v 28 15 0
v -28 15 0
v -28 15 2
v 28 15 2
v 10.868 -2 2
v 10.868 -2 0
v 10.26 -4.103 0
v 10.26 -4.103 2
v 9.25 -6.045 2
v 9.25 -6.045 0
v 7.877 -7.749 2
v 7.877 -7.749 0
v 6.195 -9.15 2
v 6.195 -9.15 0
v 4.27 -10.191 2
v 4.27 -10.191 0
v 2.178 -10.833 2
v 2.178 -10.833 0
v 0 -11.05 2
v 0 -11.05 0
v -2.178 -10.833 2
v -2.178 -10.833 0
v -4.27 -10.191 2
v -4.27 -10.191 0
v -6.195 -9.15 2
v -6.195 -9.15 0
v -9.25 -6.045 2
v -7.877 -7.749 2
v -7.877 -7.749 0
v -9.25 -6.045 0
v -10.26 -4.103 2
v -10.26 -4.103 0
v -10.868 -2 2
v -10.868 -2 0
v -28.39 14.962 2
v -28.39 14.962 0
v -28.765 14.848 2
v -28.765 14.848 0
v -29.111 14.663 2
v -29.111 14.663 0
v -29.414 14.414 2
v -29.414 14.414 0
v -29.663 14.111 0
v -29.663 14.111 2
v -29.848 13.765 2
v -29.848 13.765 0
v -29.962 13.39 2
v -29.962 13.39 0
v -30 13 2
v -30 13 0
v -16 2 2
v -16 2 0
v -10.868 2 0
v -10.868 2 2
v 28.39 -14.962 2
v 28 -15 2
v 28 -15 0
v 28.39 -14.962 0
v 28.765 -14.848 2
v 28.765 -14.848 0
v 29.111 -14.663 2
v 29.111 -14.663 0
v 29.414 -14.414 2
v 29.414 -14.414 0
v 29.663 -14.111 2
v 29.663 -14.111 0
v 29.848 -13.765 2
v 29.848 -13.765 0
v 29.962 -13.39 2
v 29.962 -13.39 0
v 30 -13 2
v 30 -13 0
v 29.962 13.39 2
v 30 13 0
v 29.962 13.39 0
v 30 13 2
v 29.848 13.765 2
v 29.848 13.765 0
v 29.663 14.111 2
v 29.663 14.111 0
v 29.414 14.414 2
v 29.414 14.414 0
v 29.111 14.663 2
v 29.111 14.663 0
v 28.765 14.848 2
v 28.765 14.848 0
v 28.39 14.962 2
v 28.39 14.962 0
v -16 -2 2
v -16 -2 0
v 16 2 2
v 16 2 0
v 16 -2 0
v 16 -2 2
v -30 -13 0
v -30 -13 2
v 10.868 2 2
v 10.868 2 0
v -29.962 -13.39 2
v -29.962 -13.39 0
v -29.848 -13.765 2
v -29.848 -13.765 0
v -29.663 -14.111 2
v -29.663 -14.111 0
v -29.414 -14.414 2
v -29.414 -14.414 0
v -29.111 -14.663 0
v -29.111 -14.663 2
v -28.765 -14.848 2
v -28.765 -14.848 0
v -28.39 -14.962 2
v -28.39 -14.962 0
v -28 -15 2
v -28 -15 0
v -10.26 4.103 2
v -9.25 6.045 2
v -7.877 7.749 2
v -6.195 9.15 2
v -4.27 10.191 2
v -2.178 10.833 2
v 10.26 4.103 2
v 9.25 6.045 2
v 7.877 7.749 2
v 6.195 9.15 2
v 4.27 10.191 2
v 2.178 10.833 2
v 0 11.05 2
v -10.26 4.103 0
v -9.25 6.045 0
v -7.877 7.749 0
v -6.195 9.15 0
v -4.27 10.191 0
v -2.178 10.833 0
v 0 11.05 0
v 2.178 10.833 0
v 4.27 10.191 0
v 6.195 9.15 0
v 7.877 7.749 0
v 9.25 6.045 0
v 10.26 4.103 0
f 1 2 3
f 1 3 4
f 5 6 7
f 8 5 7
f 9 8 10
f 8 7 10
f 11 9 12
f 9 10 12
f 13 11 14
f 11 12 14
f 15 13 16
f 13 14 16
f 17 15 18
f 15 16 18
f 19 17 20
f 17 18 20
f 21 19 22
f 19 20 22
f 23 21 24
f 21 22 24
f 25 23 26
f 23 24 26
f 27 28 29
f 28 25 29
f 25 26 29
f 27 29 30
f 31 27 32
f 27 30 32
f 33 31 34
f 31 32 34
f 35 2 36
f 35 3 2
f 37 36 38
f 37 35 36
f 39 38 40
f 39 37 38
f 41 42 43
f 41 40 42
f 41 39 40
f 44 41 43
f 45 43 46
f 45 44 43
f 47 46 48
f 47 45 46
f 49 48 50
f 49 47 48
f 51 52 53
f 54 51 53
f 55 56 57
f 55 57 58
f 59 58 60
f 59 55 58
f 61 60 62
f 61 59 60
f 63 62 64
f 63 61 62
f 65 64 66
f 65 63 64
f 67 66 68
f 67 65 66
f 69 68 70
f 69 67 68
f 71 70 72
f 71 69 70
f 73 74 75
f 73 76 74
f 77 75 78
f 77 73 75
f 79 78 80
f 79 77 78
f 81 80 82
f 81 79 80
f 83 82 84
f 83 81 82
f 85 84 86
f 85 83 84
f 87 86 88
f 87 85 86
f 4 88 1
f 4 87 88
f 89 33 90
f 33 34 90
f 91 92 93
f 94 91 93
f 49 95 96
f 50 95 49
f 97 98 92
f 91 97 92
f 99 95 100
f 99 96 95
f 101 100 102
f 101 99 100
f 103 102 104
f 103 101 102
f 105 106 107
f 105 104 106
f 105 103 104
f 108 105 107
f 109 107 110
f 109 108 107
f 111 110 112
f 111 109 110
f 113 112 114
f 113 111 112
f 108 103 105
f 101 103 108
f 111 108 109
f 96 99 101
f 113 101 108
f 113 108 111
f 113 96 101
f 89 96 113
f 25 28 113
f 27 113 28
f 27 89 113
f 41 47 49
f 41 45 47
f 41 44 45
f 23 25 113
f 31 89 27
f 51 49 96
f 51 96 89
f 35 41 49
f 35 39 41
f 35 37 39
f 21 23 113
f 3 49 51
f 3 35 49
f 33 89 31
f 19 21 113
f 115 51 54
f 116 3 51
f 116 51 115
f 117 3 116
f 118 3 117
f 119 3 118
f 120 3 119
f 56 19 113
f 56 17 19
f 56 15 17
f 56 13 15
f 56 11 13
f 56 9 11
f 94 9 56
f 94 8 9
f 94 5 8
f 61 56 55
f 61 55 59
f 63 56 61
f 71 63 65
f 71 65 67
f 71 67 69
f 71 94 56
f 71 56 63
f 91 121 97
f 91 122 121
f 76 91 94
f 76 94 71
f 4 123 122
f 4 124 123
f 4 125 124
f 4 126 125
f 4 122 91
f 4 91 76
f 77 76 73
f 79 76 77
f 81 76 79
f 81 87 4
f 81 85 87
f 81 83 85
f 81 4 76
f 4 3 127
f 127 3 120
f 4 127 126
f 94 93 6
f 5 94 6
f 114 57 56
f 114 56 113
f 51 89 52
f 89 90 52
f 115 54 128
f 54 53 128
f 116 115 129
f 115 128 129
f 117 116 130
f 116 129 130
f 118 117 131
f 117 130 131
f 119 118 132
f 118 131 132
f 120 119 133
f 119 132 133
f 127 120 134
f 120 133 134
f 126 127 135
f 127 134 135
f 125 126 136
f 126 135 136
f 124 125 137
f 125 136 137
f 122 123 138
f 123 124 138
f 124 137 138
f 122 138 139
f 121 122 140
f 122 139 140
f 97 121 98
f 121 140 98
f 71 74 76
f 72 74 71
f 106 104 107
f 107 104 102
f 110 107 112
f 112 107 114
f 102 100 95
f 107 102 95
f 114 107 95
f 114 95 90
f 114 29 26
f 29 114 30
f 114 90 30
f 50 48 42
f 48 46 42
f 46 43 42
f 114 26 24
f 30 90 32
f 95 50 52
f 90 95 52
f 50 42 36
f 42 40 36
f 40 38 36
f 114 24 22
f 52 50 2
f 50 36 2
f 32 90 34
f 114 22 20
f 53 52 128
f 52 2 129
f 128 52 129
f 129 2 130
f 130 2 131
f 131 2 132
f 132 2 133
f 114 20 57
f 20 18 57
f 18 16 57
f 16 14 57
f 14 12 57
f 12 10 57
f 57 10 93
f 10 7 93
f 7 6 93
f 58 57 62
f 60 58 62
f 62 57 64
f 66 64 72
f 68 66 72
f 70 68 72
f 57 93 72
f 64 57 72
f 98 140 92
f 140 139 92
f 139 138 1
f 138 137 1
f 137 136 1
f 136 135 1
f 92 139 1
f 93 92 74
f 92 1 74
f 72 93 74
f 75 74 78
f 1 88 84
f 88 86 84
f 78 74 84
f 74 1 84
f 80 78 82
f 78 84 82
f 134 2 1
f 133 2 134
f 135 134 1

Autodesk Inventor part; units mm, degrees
ref_plane "YZ Plane" through (0, 0, 0) normal (1, 0, 0) x (0, 1, 0)
ref_plane "XZ Plane" through (0, 0, 0) normal (0, 1, 0) x (-1, 0, 0)
ref_plane "XY Plane" through (0, 0, 0) normal (0, 0, 1) x (1, 0, 0)
sketch "Sketch1" plane through (0, 0, 0) normal (0, 0, 1) x (1, 0, 0)
  arc A0 (-10.8675, 2) -> (-10.8675, -2) centre (0, 0) ccw
  line L0 (16, -2) -> (-16, -2)
  line L1 (-16, -2) -> (-16, 2)
  line L2 (-16, 2) -> (16, 2)
  line L3 (16, 2) -> (16, -2)
  line L4 (16, -2) -> (-16, 2) construction
  line L5 (-16, -2) -> (16, 2) construction
  arc A1 (10.8675, 2) -> (-10.8675, 2) centre (0, 0) ccw
  arc A2 (-10.8675, -2) -> (10.8675, -2) centre (0, 0) ccw
  line L6 (30, -15) -> (-30, -15)
  line L7 (-30, -15) -> (-30, 15)
  line L8 (-30, 15) -> (30, 15)
  line L9 (30, 15) -> (30, -15)
  line L10 (30, -15) -> (-30, 15) construction
  line L11 (-30, -15) -> (30, 15) construction
  arc A3 (10.8675, -2) -> (10.8675, 2) centre (0, 0) ccw
  dimension "d0" = 22.1
  dimension "d1" = 32
  dimension "d2" = 4
  dimension "d3" = 60
  dimension "d4" = 30
extrude "Extrusion1" add sketch "Sketch1" along normal blind 2
fillet "Fillet1" radius 2 4 edges at (30, 15, 1) (-30, 15, 1) (30, -15, 1) (-30, -15, 1)
properties part number "HeatSink-sheet-H2mm"
